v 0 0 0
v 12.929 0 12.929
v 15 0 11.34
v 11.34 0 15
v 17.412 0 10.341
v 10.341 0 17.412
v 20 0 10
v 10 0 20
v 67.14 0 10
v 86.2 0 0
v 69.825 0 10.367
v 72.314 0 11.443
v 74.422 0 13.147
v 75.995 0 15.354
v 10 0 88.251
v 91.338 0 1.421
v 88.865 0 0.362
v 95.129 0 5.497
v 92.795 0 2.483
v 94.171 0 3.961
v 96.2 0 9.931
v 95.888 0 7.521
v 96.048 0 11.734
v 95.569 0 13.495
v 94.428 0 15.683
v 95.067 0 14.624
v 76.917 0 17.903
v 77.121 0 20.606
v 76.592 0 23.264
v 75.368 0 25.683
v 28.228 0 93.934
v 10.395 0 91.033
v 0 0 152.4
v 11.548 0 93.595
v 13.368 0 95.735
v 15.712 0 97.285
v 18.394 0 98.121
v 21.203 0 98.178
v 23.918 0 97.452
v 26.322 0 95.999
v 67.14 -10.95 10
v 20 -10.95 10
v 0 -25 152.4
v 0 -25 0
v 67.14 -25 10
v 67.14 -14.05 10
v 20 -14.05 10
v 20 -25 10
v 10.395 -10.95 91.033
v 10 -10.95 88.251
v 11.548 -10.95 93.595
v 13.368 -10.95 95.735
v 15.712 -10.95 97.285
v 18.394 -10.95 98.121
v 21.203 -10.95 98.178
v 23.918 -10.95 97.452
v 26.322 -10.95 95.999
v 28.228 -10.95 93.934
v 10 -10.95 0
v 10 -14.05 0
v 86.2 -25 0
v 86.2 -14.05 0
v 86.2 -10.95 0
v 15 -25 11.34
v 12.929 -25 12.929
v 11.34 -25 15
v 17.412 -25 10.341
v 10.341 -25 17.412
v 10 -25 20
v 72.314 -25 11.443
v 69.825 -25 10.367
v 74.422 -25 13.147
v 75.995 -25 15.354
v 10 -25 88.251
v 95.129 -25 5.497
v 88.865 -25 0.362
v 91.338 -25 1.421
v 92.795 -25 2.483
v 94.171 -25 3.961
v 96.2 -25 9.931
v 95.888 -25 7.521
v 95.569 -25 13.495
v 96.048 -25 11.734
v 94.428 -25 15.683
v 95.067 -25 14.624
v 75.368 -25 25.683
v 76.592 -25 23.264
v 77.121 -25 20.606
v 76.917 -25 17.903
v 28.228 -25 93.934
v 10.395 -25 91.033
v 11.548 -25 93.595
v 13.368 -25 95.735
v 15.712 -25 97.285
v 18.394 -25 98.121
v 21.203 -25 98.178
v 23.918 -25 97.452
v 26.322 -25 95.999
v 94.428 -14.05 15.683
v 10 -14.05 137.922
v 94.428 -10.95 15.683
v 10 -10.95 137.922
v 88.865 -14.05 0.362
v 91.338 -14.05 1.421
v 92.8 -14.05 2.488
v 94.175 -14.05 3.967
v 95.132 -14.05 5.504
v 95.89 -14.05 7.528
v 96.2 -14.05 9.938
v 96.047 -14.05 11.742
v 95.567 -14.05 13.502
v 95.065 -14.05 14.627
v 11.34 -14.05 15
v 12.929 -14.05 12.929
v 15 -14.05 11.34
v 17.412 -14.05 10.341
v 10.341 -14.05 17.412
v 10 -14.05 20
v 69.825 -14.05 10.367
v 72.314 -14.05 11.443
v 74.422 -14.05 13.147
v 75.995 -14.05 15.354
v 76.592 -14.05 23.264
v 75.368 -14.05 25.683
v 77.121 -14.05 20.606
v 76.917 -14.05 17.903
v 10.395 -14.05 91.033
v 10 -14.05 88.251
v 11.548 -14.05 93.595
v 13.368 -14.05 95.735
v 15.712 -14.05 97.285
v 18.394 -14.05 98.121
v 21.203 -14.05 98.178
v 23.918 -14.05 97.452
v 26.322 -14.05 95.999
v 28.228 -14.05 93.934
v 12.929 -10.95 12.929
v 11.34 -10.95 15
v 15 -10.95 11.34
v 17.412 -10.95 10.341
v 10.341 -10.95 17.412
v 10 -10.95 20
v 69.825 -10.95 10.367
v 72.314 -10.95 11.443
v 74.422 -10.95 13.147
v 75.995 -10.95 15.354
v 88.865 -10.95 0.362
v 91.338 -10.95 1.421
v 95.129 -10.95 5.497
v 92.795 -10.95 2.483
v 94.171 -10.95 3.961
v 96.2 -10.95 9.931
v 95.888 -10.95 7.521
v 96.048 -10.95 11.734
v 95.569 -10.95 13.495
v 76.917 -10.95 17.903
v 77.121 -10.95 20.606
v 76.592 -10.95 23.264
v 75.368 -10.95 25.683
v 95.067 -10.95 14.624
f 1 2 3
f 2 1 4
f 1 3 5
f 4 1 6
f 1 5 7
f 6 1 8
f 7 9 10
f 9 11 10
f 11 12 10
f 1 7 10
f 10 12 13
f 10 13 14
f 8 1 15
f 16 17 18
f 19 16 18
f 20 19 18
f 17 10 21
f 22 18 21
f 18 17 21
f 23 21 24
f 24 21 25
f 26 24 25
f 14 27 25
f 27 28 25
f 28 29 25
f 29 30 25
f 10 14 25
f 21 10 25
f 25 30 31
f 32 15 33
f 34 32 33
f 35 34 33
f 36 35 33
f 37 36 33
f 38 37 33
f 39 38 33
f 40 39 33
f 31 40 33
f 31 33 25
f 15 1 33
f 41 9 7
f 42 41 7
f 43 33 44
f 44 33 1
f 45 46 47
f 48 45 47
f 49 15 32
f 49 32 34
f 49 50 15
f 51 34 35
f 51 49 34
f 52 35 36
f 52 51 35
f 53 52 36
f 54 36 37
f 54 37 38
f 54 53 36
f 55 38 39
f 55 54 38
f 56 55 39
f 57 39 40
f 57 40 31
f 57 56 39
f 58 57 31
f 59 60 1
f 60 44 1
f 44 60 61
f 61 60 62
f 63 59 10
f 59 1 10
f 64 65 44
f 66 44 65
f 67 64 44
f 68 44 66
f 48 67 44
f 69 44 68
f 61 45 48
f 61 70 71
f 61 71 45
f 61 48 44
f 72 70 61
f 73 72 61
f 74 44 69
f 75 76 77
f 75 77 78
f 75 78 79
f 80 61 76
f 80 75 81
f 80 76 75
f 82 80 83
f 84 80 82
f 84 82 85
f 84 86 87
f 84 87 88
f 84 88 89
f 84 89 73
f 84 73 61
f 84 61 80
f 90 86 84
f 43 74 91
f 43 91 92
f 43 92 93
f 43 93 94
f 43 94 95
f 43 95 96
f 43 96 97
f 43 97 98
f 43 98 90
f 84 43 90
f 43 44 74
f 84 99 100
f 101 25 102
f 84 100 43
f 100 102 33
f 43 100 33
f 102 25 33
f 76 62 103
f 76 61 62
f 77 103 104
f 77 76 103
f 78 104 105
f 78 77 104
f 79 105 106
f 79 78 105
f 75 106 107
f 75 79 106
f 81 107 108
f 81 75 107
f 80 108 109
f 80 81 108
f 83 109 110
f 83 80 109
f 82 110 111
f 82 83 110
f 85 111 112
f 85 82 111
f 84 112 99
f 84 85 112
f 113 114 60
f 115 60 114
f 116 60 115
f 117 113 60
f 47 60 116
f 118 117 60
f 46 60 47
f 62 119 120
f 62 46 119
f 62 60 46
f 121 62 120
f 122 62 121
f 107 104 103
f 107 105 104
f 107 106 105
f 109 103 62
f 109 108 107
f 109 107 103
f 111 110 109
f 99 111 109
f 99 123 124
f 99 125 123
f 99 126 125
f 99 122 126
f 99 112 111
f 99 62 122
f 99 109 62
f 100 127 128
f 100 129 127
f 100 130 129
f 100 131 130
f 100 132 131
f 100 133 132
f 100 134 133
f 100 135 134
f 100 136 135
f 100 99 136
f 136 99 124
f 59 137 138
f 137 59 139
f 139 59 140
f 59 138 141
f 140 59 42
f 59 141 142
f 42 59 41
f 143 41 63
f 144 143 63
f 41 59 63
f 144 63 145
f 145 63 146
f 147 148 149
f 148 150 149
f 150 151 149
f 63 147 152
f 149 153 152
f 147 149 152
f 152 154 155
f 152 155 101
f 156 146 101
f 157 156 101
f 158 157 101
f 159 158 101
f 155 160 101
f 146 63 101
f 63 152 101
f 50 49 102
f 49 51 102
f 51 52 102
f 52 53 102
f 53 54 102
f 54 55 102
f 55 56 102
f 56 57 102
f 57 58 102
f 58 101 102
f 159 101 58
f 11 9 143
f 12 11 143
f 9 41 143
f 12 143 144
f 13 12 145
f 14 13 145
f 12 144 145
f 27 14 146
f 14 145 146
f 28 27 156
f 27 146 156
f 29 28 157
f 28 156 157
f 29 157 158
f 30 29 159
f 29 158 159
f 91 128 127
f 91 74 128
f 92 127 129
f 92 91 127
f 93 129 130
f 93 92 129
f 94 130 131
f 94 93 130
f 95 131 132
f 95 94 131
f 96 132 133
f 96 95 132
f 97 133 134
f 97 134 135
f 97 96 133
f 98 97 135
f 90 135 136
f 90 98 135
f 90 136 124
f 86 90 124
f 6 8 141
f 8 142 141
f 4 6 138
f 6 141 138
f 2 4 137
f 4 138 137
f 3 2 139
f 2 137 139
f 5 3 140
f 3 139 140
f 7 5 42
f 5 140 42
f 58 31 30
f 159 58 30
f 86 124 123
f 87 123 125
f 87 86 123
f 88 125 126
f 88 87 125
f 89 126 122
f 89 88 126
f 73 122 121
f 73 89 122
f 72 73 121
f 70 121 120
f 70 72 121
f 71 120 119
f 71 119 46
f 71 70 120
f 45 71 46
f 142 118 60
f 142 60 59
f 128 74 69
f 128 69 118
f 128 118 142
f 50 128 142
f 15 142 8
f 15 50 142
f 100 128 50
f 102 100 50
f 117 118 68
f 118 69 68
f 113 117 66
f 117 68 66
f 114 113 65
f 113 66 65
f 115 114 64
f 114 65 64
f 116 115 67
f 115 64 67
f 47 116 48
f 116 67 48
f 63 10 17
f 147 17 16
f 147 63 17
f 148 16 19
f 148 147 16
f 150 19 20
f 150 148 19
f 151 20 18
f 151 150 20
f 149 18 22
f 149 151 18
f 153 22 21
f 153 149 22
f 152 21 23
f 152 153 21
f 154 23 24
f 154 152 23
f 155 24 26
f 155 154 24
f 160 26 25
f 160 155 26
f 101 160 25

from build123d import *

# Parameters (mm, degrees)
F1_DEPTH = 25
F3_W     = 3.1
F3_H     = 395.207942
F4_DEPTH = 153
F5_R     = 10


with BuildPart() as f1:
    # F0 (on Front) → F1 (new body)
    with BuildSketch(Plane.XZ):
        Polygon((0, 0), (93.106838, 0), (105.260208, 0), (98.35337, 10), (0, 152.4), align=None)
        Polygon((10, 10), (10, 120.325452), (86.2, 10), align=None, mode=Mode.SUBTRACT)
    extrude(amount=F1_DEPTH)

    # F3 (on offset) → F4 (cut, through all)
    with BuildSketch(Plane.YZ.offset(163)):
        with Locations((-12.5, 0)):
            Rectangle(F3_W, F3_H)
    extrude(amount=-F4_DEPTH, mode=Mode.SUBTRACT)

    # F5
    f5_edges = [f1.edges().sort_by_distance(p)[0] for p in [
        (105.260208, -19.525, 0),
        (105.260208, -5.475, 0),
        (10, -19.525, 10),
        (10, -5.475, 10),
        (10, -19.525, 120.325452),
        (10, -5.475, 120.325452),
        (86.2, -19.525, 10),
        (86.2, -5.475, 10),
    ]]
    fillet(f5_edges, radius=F5_R)


solid = f1.part
